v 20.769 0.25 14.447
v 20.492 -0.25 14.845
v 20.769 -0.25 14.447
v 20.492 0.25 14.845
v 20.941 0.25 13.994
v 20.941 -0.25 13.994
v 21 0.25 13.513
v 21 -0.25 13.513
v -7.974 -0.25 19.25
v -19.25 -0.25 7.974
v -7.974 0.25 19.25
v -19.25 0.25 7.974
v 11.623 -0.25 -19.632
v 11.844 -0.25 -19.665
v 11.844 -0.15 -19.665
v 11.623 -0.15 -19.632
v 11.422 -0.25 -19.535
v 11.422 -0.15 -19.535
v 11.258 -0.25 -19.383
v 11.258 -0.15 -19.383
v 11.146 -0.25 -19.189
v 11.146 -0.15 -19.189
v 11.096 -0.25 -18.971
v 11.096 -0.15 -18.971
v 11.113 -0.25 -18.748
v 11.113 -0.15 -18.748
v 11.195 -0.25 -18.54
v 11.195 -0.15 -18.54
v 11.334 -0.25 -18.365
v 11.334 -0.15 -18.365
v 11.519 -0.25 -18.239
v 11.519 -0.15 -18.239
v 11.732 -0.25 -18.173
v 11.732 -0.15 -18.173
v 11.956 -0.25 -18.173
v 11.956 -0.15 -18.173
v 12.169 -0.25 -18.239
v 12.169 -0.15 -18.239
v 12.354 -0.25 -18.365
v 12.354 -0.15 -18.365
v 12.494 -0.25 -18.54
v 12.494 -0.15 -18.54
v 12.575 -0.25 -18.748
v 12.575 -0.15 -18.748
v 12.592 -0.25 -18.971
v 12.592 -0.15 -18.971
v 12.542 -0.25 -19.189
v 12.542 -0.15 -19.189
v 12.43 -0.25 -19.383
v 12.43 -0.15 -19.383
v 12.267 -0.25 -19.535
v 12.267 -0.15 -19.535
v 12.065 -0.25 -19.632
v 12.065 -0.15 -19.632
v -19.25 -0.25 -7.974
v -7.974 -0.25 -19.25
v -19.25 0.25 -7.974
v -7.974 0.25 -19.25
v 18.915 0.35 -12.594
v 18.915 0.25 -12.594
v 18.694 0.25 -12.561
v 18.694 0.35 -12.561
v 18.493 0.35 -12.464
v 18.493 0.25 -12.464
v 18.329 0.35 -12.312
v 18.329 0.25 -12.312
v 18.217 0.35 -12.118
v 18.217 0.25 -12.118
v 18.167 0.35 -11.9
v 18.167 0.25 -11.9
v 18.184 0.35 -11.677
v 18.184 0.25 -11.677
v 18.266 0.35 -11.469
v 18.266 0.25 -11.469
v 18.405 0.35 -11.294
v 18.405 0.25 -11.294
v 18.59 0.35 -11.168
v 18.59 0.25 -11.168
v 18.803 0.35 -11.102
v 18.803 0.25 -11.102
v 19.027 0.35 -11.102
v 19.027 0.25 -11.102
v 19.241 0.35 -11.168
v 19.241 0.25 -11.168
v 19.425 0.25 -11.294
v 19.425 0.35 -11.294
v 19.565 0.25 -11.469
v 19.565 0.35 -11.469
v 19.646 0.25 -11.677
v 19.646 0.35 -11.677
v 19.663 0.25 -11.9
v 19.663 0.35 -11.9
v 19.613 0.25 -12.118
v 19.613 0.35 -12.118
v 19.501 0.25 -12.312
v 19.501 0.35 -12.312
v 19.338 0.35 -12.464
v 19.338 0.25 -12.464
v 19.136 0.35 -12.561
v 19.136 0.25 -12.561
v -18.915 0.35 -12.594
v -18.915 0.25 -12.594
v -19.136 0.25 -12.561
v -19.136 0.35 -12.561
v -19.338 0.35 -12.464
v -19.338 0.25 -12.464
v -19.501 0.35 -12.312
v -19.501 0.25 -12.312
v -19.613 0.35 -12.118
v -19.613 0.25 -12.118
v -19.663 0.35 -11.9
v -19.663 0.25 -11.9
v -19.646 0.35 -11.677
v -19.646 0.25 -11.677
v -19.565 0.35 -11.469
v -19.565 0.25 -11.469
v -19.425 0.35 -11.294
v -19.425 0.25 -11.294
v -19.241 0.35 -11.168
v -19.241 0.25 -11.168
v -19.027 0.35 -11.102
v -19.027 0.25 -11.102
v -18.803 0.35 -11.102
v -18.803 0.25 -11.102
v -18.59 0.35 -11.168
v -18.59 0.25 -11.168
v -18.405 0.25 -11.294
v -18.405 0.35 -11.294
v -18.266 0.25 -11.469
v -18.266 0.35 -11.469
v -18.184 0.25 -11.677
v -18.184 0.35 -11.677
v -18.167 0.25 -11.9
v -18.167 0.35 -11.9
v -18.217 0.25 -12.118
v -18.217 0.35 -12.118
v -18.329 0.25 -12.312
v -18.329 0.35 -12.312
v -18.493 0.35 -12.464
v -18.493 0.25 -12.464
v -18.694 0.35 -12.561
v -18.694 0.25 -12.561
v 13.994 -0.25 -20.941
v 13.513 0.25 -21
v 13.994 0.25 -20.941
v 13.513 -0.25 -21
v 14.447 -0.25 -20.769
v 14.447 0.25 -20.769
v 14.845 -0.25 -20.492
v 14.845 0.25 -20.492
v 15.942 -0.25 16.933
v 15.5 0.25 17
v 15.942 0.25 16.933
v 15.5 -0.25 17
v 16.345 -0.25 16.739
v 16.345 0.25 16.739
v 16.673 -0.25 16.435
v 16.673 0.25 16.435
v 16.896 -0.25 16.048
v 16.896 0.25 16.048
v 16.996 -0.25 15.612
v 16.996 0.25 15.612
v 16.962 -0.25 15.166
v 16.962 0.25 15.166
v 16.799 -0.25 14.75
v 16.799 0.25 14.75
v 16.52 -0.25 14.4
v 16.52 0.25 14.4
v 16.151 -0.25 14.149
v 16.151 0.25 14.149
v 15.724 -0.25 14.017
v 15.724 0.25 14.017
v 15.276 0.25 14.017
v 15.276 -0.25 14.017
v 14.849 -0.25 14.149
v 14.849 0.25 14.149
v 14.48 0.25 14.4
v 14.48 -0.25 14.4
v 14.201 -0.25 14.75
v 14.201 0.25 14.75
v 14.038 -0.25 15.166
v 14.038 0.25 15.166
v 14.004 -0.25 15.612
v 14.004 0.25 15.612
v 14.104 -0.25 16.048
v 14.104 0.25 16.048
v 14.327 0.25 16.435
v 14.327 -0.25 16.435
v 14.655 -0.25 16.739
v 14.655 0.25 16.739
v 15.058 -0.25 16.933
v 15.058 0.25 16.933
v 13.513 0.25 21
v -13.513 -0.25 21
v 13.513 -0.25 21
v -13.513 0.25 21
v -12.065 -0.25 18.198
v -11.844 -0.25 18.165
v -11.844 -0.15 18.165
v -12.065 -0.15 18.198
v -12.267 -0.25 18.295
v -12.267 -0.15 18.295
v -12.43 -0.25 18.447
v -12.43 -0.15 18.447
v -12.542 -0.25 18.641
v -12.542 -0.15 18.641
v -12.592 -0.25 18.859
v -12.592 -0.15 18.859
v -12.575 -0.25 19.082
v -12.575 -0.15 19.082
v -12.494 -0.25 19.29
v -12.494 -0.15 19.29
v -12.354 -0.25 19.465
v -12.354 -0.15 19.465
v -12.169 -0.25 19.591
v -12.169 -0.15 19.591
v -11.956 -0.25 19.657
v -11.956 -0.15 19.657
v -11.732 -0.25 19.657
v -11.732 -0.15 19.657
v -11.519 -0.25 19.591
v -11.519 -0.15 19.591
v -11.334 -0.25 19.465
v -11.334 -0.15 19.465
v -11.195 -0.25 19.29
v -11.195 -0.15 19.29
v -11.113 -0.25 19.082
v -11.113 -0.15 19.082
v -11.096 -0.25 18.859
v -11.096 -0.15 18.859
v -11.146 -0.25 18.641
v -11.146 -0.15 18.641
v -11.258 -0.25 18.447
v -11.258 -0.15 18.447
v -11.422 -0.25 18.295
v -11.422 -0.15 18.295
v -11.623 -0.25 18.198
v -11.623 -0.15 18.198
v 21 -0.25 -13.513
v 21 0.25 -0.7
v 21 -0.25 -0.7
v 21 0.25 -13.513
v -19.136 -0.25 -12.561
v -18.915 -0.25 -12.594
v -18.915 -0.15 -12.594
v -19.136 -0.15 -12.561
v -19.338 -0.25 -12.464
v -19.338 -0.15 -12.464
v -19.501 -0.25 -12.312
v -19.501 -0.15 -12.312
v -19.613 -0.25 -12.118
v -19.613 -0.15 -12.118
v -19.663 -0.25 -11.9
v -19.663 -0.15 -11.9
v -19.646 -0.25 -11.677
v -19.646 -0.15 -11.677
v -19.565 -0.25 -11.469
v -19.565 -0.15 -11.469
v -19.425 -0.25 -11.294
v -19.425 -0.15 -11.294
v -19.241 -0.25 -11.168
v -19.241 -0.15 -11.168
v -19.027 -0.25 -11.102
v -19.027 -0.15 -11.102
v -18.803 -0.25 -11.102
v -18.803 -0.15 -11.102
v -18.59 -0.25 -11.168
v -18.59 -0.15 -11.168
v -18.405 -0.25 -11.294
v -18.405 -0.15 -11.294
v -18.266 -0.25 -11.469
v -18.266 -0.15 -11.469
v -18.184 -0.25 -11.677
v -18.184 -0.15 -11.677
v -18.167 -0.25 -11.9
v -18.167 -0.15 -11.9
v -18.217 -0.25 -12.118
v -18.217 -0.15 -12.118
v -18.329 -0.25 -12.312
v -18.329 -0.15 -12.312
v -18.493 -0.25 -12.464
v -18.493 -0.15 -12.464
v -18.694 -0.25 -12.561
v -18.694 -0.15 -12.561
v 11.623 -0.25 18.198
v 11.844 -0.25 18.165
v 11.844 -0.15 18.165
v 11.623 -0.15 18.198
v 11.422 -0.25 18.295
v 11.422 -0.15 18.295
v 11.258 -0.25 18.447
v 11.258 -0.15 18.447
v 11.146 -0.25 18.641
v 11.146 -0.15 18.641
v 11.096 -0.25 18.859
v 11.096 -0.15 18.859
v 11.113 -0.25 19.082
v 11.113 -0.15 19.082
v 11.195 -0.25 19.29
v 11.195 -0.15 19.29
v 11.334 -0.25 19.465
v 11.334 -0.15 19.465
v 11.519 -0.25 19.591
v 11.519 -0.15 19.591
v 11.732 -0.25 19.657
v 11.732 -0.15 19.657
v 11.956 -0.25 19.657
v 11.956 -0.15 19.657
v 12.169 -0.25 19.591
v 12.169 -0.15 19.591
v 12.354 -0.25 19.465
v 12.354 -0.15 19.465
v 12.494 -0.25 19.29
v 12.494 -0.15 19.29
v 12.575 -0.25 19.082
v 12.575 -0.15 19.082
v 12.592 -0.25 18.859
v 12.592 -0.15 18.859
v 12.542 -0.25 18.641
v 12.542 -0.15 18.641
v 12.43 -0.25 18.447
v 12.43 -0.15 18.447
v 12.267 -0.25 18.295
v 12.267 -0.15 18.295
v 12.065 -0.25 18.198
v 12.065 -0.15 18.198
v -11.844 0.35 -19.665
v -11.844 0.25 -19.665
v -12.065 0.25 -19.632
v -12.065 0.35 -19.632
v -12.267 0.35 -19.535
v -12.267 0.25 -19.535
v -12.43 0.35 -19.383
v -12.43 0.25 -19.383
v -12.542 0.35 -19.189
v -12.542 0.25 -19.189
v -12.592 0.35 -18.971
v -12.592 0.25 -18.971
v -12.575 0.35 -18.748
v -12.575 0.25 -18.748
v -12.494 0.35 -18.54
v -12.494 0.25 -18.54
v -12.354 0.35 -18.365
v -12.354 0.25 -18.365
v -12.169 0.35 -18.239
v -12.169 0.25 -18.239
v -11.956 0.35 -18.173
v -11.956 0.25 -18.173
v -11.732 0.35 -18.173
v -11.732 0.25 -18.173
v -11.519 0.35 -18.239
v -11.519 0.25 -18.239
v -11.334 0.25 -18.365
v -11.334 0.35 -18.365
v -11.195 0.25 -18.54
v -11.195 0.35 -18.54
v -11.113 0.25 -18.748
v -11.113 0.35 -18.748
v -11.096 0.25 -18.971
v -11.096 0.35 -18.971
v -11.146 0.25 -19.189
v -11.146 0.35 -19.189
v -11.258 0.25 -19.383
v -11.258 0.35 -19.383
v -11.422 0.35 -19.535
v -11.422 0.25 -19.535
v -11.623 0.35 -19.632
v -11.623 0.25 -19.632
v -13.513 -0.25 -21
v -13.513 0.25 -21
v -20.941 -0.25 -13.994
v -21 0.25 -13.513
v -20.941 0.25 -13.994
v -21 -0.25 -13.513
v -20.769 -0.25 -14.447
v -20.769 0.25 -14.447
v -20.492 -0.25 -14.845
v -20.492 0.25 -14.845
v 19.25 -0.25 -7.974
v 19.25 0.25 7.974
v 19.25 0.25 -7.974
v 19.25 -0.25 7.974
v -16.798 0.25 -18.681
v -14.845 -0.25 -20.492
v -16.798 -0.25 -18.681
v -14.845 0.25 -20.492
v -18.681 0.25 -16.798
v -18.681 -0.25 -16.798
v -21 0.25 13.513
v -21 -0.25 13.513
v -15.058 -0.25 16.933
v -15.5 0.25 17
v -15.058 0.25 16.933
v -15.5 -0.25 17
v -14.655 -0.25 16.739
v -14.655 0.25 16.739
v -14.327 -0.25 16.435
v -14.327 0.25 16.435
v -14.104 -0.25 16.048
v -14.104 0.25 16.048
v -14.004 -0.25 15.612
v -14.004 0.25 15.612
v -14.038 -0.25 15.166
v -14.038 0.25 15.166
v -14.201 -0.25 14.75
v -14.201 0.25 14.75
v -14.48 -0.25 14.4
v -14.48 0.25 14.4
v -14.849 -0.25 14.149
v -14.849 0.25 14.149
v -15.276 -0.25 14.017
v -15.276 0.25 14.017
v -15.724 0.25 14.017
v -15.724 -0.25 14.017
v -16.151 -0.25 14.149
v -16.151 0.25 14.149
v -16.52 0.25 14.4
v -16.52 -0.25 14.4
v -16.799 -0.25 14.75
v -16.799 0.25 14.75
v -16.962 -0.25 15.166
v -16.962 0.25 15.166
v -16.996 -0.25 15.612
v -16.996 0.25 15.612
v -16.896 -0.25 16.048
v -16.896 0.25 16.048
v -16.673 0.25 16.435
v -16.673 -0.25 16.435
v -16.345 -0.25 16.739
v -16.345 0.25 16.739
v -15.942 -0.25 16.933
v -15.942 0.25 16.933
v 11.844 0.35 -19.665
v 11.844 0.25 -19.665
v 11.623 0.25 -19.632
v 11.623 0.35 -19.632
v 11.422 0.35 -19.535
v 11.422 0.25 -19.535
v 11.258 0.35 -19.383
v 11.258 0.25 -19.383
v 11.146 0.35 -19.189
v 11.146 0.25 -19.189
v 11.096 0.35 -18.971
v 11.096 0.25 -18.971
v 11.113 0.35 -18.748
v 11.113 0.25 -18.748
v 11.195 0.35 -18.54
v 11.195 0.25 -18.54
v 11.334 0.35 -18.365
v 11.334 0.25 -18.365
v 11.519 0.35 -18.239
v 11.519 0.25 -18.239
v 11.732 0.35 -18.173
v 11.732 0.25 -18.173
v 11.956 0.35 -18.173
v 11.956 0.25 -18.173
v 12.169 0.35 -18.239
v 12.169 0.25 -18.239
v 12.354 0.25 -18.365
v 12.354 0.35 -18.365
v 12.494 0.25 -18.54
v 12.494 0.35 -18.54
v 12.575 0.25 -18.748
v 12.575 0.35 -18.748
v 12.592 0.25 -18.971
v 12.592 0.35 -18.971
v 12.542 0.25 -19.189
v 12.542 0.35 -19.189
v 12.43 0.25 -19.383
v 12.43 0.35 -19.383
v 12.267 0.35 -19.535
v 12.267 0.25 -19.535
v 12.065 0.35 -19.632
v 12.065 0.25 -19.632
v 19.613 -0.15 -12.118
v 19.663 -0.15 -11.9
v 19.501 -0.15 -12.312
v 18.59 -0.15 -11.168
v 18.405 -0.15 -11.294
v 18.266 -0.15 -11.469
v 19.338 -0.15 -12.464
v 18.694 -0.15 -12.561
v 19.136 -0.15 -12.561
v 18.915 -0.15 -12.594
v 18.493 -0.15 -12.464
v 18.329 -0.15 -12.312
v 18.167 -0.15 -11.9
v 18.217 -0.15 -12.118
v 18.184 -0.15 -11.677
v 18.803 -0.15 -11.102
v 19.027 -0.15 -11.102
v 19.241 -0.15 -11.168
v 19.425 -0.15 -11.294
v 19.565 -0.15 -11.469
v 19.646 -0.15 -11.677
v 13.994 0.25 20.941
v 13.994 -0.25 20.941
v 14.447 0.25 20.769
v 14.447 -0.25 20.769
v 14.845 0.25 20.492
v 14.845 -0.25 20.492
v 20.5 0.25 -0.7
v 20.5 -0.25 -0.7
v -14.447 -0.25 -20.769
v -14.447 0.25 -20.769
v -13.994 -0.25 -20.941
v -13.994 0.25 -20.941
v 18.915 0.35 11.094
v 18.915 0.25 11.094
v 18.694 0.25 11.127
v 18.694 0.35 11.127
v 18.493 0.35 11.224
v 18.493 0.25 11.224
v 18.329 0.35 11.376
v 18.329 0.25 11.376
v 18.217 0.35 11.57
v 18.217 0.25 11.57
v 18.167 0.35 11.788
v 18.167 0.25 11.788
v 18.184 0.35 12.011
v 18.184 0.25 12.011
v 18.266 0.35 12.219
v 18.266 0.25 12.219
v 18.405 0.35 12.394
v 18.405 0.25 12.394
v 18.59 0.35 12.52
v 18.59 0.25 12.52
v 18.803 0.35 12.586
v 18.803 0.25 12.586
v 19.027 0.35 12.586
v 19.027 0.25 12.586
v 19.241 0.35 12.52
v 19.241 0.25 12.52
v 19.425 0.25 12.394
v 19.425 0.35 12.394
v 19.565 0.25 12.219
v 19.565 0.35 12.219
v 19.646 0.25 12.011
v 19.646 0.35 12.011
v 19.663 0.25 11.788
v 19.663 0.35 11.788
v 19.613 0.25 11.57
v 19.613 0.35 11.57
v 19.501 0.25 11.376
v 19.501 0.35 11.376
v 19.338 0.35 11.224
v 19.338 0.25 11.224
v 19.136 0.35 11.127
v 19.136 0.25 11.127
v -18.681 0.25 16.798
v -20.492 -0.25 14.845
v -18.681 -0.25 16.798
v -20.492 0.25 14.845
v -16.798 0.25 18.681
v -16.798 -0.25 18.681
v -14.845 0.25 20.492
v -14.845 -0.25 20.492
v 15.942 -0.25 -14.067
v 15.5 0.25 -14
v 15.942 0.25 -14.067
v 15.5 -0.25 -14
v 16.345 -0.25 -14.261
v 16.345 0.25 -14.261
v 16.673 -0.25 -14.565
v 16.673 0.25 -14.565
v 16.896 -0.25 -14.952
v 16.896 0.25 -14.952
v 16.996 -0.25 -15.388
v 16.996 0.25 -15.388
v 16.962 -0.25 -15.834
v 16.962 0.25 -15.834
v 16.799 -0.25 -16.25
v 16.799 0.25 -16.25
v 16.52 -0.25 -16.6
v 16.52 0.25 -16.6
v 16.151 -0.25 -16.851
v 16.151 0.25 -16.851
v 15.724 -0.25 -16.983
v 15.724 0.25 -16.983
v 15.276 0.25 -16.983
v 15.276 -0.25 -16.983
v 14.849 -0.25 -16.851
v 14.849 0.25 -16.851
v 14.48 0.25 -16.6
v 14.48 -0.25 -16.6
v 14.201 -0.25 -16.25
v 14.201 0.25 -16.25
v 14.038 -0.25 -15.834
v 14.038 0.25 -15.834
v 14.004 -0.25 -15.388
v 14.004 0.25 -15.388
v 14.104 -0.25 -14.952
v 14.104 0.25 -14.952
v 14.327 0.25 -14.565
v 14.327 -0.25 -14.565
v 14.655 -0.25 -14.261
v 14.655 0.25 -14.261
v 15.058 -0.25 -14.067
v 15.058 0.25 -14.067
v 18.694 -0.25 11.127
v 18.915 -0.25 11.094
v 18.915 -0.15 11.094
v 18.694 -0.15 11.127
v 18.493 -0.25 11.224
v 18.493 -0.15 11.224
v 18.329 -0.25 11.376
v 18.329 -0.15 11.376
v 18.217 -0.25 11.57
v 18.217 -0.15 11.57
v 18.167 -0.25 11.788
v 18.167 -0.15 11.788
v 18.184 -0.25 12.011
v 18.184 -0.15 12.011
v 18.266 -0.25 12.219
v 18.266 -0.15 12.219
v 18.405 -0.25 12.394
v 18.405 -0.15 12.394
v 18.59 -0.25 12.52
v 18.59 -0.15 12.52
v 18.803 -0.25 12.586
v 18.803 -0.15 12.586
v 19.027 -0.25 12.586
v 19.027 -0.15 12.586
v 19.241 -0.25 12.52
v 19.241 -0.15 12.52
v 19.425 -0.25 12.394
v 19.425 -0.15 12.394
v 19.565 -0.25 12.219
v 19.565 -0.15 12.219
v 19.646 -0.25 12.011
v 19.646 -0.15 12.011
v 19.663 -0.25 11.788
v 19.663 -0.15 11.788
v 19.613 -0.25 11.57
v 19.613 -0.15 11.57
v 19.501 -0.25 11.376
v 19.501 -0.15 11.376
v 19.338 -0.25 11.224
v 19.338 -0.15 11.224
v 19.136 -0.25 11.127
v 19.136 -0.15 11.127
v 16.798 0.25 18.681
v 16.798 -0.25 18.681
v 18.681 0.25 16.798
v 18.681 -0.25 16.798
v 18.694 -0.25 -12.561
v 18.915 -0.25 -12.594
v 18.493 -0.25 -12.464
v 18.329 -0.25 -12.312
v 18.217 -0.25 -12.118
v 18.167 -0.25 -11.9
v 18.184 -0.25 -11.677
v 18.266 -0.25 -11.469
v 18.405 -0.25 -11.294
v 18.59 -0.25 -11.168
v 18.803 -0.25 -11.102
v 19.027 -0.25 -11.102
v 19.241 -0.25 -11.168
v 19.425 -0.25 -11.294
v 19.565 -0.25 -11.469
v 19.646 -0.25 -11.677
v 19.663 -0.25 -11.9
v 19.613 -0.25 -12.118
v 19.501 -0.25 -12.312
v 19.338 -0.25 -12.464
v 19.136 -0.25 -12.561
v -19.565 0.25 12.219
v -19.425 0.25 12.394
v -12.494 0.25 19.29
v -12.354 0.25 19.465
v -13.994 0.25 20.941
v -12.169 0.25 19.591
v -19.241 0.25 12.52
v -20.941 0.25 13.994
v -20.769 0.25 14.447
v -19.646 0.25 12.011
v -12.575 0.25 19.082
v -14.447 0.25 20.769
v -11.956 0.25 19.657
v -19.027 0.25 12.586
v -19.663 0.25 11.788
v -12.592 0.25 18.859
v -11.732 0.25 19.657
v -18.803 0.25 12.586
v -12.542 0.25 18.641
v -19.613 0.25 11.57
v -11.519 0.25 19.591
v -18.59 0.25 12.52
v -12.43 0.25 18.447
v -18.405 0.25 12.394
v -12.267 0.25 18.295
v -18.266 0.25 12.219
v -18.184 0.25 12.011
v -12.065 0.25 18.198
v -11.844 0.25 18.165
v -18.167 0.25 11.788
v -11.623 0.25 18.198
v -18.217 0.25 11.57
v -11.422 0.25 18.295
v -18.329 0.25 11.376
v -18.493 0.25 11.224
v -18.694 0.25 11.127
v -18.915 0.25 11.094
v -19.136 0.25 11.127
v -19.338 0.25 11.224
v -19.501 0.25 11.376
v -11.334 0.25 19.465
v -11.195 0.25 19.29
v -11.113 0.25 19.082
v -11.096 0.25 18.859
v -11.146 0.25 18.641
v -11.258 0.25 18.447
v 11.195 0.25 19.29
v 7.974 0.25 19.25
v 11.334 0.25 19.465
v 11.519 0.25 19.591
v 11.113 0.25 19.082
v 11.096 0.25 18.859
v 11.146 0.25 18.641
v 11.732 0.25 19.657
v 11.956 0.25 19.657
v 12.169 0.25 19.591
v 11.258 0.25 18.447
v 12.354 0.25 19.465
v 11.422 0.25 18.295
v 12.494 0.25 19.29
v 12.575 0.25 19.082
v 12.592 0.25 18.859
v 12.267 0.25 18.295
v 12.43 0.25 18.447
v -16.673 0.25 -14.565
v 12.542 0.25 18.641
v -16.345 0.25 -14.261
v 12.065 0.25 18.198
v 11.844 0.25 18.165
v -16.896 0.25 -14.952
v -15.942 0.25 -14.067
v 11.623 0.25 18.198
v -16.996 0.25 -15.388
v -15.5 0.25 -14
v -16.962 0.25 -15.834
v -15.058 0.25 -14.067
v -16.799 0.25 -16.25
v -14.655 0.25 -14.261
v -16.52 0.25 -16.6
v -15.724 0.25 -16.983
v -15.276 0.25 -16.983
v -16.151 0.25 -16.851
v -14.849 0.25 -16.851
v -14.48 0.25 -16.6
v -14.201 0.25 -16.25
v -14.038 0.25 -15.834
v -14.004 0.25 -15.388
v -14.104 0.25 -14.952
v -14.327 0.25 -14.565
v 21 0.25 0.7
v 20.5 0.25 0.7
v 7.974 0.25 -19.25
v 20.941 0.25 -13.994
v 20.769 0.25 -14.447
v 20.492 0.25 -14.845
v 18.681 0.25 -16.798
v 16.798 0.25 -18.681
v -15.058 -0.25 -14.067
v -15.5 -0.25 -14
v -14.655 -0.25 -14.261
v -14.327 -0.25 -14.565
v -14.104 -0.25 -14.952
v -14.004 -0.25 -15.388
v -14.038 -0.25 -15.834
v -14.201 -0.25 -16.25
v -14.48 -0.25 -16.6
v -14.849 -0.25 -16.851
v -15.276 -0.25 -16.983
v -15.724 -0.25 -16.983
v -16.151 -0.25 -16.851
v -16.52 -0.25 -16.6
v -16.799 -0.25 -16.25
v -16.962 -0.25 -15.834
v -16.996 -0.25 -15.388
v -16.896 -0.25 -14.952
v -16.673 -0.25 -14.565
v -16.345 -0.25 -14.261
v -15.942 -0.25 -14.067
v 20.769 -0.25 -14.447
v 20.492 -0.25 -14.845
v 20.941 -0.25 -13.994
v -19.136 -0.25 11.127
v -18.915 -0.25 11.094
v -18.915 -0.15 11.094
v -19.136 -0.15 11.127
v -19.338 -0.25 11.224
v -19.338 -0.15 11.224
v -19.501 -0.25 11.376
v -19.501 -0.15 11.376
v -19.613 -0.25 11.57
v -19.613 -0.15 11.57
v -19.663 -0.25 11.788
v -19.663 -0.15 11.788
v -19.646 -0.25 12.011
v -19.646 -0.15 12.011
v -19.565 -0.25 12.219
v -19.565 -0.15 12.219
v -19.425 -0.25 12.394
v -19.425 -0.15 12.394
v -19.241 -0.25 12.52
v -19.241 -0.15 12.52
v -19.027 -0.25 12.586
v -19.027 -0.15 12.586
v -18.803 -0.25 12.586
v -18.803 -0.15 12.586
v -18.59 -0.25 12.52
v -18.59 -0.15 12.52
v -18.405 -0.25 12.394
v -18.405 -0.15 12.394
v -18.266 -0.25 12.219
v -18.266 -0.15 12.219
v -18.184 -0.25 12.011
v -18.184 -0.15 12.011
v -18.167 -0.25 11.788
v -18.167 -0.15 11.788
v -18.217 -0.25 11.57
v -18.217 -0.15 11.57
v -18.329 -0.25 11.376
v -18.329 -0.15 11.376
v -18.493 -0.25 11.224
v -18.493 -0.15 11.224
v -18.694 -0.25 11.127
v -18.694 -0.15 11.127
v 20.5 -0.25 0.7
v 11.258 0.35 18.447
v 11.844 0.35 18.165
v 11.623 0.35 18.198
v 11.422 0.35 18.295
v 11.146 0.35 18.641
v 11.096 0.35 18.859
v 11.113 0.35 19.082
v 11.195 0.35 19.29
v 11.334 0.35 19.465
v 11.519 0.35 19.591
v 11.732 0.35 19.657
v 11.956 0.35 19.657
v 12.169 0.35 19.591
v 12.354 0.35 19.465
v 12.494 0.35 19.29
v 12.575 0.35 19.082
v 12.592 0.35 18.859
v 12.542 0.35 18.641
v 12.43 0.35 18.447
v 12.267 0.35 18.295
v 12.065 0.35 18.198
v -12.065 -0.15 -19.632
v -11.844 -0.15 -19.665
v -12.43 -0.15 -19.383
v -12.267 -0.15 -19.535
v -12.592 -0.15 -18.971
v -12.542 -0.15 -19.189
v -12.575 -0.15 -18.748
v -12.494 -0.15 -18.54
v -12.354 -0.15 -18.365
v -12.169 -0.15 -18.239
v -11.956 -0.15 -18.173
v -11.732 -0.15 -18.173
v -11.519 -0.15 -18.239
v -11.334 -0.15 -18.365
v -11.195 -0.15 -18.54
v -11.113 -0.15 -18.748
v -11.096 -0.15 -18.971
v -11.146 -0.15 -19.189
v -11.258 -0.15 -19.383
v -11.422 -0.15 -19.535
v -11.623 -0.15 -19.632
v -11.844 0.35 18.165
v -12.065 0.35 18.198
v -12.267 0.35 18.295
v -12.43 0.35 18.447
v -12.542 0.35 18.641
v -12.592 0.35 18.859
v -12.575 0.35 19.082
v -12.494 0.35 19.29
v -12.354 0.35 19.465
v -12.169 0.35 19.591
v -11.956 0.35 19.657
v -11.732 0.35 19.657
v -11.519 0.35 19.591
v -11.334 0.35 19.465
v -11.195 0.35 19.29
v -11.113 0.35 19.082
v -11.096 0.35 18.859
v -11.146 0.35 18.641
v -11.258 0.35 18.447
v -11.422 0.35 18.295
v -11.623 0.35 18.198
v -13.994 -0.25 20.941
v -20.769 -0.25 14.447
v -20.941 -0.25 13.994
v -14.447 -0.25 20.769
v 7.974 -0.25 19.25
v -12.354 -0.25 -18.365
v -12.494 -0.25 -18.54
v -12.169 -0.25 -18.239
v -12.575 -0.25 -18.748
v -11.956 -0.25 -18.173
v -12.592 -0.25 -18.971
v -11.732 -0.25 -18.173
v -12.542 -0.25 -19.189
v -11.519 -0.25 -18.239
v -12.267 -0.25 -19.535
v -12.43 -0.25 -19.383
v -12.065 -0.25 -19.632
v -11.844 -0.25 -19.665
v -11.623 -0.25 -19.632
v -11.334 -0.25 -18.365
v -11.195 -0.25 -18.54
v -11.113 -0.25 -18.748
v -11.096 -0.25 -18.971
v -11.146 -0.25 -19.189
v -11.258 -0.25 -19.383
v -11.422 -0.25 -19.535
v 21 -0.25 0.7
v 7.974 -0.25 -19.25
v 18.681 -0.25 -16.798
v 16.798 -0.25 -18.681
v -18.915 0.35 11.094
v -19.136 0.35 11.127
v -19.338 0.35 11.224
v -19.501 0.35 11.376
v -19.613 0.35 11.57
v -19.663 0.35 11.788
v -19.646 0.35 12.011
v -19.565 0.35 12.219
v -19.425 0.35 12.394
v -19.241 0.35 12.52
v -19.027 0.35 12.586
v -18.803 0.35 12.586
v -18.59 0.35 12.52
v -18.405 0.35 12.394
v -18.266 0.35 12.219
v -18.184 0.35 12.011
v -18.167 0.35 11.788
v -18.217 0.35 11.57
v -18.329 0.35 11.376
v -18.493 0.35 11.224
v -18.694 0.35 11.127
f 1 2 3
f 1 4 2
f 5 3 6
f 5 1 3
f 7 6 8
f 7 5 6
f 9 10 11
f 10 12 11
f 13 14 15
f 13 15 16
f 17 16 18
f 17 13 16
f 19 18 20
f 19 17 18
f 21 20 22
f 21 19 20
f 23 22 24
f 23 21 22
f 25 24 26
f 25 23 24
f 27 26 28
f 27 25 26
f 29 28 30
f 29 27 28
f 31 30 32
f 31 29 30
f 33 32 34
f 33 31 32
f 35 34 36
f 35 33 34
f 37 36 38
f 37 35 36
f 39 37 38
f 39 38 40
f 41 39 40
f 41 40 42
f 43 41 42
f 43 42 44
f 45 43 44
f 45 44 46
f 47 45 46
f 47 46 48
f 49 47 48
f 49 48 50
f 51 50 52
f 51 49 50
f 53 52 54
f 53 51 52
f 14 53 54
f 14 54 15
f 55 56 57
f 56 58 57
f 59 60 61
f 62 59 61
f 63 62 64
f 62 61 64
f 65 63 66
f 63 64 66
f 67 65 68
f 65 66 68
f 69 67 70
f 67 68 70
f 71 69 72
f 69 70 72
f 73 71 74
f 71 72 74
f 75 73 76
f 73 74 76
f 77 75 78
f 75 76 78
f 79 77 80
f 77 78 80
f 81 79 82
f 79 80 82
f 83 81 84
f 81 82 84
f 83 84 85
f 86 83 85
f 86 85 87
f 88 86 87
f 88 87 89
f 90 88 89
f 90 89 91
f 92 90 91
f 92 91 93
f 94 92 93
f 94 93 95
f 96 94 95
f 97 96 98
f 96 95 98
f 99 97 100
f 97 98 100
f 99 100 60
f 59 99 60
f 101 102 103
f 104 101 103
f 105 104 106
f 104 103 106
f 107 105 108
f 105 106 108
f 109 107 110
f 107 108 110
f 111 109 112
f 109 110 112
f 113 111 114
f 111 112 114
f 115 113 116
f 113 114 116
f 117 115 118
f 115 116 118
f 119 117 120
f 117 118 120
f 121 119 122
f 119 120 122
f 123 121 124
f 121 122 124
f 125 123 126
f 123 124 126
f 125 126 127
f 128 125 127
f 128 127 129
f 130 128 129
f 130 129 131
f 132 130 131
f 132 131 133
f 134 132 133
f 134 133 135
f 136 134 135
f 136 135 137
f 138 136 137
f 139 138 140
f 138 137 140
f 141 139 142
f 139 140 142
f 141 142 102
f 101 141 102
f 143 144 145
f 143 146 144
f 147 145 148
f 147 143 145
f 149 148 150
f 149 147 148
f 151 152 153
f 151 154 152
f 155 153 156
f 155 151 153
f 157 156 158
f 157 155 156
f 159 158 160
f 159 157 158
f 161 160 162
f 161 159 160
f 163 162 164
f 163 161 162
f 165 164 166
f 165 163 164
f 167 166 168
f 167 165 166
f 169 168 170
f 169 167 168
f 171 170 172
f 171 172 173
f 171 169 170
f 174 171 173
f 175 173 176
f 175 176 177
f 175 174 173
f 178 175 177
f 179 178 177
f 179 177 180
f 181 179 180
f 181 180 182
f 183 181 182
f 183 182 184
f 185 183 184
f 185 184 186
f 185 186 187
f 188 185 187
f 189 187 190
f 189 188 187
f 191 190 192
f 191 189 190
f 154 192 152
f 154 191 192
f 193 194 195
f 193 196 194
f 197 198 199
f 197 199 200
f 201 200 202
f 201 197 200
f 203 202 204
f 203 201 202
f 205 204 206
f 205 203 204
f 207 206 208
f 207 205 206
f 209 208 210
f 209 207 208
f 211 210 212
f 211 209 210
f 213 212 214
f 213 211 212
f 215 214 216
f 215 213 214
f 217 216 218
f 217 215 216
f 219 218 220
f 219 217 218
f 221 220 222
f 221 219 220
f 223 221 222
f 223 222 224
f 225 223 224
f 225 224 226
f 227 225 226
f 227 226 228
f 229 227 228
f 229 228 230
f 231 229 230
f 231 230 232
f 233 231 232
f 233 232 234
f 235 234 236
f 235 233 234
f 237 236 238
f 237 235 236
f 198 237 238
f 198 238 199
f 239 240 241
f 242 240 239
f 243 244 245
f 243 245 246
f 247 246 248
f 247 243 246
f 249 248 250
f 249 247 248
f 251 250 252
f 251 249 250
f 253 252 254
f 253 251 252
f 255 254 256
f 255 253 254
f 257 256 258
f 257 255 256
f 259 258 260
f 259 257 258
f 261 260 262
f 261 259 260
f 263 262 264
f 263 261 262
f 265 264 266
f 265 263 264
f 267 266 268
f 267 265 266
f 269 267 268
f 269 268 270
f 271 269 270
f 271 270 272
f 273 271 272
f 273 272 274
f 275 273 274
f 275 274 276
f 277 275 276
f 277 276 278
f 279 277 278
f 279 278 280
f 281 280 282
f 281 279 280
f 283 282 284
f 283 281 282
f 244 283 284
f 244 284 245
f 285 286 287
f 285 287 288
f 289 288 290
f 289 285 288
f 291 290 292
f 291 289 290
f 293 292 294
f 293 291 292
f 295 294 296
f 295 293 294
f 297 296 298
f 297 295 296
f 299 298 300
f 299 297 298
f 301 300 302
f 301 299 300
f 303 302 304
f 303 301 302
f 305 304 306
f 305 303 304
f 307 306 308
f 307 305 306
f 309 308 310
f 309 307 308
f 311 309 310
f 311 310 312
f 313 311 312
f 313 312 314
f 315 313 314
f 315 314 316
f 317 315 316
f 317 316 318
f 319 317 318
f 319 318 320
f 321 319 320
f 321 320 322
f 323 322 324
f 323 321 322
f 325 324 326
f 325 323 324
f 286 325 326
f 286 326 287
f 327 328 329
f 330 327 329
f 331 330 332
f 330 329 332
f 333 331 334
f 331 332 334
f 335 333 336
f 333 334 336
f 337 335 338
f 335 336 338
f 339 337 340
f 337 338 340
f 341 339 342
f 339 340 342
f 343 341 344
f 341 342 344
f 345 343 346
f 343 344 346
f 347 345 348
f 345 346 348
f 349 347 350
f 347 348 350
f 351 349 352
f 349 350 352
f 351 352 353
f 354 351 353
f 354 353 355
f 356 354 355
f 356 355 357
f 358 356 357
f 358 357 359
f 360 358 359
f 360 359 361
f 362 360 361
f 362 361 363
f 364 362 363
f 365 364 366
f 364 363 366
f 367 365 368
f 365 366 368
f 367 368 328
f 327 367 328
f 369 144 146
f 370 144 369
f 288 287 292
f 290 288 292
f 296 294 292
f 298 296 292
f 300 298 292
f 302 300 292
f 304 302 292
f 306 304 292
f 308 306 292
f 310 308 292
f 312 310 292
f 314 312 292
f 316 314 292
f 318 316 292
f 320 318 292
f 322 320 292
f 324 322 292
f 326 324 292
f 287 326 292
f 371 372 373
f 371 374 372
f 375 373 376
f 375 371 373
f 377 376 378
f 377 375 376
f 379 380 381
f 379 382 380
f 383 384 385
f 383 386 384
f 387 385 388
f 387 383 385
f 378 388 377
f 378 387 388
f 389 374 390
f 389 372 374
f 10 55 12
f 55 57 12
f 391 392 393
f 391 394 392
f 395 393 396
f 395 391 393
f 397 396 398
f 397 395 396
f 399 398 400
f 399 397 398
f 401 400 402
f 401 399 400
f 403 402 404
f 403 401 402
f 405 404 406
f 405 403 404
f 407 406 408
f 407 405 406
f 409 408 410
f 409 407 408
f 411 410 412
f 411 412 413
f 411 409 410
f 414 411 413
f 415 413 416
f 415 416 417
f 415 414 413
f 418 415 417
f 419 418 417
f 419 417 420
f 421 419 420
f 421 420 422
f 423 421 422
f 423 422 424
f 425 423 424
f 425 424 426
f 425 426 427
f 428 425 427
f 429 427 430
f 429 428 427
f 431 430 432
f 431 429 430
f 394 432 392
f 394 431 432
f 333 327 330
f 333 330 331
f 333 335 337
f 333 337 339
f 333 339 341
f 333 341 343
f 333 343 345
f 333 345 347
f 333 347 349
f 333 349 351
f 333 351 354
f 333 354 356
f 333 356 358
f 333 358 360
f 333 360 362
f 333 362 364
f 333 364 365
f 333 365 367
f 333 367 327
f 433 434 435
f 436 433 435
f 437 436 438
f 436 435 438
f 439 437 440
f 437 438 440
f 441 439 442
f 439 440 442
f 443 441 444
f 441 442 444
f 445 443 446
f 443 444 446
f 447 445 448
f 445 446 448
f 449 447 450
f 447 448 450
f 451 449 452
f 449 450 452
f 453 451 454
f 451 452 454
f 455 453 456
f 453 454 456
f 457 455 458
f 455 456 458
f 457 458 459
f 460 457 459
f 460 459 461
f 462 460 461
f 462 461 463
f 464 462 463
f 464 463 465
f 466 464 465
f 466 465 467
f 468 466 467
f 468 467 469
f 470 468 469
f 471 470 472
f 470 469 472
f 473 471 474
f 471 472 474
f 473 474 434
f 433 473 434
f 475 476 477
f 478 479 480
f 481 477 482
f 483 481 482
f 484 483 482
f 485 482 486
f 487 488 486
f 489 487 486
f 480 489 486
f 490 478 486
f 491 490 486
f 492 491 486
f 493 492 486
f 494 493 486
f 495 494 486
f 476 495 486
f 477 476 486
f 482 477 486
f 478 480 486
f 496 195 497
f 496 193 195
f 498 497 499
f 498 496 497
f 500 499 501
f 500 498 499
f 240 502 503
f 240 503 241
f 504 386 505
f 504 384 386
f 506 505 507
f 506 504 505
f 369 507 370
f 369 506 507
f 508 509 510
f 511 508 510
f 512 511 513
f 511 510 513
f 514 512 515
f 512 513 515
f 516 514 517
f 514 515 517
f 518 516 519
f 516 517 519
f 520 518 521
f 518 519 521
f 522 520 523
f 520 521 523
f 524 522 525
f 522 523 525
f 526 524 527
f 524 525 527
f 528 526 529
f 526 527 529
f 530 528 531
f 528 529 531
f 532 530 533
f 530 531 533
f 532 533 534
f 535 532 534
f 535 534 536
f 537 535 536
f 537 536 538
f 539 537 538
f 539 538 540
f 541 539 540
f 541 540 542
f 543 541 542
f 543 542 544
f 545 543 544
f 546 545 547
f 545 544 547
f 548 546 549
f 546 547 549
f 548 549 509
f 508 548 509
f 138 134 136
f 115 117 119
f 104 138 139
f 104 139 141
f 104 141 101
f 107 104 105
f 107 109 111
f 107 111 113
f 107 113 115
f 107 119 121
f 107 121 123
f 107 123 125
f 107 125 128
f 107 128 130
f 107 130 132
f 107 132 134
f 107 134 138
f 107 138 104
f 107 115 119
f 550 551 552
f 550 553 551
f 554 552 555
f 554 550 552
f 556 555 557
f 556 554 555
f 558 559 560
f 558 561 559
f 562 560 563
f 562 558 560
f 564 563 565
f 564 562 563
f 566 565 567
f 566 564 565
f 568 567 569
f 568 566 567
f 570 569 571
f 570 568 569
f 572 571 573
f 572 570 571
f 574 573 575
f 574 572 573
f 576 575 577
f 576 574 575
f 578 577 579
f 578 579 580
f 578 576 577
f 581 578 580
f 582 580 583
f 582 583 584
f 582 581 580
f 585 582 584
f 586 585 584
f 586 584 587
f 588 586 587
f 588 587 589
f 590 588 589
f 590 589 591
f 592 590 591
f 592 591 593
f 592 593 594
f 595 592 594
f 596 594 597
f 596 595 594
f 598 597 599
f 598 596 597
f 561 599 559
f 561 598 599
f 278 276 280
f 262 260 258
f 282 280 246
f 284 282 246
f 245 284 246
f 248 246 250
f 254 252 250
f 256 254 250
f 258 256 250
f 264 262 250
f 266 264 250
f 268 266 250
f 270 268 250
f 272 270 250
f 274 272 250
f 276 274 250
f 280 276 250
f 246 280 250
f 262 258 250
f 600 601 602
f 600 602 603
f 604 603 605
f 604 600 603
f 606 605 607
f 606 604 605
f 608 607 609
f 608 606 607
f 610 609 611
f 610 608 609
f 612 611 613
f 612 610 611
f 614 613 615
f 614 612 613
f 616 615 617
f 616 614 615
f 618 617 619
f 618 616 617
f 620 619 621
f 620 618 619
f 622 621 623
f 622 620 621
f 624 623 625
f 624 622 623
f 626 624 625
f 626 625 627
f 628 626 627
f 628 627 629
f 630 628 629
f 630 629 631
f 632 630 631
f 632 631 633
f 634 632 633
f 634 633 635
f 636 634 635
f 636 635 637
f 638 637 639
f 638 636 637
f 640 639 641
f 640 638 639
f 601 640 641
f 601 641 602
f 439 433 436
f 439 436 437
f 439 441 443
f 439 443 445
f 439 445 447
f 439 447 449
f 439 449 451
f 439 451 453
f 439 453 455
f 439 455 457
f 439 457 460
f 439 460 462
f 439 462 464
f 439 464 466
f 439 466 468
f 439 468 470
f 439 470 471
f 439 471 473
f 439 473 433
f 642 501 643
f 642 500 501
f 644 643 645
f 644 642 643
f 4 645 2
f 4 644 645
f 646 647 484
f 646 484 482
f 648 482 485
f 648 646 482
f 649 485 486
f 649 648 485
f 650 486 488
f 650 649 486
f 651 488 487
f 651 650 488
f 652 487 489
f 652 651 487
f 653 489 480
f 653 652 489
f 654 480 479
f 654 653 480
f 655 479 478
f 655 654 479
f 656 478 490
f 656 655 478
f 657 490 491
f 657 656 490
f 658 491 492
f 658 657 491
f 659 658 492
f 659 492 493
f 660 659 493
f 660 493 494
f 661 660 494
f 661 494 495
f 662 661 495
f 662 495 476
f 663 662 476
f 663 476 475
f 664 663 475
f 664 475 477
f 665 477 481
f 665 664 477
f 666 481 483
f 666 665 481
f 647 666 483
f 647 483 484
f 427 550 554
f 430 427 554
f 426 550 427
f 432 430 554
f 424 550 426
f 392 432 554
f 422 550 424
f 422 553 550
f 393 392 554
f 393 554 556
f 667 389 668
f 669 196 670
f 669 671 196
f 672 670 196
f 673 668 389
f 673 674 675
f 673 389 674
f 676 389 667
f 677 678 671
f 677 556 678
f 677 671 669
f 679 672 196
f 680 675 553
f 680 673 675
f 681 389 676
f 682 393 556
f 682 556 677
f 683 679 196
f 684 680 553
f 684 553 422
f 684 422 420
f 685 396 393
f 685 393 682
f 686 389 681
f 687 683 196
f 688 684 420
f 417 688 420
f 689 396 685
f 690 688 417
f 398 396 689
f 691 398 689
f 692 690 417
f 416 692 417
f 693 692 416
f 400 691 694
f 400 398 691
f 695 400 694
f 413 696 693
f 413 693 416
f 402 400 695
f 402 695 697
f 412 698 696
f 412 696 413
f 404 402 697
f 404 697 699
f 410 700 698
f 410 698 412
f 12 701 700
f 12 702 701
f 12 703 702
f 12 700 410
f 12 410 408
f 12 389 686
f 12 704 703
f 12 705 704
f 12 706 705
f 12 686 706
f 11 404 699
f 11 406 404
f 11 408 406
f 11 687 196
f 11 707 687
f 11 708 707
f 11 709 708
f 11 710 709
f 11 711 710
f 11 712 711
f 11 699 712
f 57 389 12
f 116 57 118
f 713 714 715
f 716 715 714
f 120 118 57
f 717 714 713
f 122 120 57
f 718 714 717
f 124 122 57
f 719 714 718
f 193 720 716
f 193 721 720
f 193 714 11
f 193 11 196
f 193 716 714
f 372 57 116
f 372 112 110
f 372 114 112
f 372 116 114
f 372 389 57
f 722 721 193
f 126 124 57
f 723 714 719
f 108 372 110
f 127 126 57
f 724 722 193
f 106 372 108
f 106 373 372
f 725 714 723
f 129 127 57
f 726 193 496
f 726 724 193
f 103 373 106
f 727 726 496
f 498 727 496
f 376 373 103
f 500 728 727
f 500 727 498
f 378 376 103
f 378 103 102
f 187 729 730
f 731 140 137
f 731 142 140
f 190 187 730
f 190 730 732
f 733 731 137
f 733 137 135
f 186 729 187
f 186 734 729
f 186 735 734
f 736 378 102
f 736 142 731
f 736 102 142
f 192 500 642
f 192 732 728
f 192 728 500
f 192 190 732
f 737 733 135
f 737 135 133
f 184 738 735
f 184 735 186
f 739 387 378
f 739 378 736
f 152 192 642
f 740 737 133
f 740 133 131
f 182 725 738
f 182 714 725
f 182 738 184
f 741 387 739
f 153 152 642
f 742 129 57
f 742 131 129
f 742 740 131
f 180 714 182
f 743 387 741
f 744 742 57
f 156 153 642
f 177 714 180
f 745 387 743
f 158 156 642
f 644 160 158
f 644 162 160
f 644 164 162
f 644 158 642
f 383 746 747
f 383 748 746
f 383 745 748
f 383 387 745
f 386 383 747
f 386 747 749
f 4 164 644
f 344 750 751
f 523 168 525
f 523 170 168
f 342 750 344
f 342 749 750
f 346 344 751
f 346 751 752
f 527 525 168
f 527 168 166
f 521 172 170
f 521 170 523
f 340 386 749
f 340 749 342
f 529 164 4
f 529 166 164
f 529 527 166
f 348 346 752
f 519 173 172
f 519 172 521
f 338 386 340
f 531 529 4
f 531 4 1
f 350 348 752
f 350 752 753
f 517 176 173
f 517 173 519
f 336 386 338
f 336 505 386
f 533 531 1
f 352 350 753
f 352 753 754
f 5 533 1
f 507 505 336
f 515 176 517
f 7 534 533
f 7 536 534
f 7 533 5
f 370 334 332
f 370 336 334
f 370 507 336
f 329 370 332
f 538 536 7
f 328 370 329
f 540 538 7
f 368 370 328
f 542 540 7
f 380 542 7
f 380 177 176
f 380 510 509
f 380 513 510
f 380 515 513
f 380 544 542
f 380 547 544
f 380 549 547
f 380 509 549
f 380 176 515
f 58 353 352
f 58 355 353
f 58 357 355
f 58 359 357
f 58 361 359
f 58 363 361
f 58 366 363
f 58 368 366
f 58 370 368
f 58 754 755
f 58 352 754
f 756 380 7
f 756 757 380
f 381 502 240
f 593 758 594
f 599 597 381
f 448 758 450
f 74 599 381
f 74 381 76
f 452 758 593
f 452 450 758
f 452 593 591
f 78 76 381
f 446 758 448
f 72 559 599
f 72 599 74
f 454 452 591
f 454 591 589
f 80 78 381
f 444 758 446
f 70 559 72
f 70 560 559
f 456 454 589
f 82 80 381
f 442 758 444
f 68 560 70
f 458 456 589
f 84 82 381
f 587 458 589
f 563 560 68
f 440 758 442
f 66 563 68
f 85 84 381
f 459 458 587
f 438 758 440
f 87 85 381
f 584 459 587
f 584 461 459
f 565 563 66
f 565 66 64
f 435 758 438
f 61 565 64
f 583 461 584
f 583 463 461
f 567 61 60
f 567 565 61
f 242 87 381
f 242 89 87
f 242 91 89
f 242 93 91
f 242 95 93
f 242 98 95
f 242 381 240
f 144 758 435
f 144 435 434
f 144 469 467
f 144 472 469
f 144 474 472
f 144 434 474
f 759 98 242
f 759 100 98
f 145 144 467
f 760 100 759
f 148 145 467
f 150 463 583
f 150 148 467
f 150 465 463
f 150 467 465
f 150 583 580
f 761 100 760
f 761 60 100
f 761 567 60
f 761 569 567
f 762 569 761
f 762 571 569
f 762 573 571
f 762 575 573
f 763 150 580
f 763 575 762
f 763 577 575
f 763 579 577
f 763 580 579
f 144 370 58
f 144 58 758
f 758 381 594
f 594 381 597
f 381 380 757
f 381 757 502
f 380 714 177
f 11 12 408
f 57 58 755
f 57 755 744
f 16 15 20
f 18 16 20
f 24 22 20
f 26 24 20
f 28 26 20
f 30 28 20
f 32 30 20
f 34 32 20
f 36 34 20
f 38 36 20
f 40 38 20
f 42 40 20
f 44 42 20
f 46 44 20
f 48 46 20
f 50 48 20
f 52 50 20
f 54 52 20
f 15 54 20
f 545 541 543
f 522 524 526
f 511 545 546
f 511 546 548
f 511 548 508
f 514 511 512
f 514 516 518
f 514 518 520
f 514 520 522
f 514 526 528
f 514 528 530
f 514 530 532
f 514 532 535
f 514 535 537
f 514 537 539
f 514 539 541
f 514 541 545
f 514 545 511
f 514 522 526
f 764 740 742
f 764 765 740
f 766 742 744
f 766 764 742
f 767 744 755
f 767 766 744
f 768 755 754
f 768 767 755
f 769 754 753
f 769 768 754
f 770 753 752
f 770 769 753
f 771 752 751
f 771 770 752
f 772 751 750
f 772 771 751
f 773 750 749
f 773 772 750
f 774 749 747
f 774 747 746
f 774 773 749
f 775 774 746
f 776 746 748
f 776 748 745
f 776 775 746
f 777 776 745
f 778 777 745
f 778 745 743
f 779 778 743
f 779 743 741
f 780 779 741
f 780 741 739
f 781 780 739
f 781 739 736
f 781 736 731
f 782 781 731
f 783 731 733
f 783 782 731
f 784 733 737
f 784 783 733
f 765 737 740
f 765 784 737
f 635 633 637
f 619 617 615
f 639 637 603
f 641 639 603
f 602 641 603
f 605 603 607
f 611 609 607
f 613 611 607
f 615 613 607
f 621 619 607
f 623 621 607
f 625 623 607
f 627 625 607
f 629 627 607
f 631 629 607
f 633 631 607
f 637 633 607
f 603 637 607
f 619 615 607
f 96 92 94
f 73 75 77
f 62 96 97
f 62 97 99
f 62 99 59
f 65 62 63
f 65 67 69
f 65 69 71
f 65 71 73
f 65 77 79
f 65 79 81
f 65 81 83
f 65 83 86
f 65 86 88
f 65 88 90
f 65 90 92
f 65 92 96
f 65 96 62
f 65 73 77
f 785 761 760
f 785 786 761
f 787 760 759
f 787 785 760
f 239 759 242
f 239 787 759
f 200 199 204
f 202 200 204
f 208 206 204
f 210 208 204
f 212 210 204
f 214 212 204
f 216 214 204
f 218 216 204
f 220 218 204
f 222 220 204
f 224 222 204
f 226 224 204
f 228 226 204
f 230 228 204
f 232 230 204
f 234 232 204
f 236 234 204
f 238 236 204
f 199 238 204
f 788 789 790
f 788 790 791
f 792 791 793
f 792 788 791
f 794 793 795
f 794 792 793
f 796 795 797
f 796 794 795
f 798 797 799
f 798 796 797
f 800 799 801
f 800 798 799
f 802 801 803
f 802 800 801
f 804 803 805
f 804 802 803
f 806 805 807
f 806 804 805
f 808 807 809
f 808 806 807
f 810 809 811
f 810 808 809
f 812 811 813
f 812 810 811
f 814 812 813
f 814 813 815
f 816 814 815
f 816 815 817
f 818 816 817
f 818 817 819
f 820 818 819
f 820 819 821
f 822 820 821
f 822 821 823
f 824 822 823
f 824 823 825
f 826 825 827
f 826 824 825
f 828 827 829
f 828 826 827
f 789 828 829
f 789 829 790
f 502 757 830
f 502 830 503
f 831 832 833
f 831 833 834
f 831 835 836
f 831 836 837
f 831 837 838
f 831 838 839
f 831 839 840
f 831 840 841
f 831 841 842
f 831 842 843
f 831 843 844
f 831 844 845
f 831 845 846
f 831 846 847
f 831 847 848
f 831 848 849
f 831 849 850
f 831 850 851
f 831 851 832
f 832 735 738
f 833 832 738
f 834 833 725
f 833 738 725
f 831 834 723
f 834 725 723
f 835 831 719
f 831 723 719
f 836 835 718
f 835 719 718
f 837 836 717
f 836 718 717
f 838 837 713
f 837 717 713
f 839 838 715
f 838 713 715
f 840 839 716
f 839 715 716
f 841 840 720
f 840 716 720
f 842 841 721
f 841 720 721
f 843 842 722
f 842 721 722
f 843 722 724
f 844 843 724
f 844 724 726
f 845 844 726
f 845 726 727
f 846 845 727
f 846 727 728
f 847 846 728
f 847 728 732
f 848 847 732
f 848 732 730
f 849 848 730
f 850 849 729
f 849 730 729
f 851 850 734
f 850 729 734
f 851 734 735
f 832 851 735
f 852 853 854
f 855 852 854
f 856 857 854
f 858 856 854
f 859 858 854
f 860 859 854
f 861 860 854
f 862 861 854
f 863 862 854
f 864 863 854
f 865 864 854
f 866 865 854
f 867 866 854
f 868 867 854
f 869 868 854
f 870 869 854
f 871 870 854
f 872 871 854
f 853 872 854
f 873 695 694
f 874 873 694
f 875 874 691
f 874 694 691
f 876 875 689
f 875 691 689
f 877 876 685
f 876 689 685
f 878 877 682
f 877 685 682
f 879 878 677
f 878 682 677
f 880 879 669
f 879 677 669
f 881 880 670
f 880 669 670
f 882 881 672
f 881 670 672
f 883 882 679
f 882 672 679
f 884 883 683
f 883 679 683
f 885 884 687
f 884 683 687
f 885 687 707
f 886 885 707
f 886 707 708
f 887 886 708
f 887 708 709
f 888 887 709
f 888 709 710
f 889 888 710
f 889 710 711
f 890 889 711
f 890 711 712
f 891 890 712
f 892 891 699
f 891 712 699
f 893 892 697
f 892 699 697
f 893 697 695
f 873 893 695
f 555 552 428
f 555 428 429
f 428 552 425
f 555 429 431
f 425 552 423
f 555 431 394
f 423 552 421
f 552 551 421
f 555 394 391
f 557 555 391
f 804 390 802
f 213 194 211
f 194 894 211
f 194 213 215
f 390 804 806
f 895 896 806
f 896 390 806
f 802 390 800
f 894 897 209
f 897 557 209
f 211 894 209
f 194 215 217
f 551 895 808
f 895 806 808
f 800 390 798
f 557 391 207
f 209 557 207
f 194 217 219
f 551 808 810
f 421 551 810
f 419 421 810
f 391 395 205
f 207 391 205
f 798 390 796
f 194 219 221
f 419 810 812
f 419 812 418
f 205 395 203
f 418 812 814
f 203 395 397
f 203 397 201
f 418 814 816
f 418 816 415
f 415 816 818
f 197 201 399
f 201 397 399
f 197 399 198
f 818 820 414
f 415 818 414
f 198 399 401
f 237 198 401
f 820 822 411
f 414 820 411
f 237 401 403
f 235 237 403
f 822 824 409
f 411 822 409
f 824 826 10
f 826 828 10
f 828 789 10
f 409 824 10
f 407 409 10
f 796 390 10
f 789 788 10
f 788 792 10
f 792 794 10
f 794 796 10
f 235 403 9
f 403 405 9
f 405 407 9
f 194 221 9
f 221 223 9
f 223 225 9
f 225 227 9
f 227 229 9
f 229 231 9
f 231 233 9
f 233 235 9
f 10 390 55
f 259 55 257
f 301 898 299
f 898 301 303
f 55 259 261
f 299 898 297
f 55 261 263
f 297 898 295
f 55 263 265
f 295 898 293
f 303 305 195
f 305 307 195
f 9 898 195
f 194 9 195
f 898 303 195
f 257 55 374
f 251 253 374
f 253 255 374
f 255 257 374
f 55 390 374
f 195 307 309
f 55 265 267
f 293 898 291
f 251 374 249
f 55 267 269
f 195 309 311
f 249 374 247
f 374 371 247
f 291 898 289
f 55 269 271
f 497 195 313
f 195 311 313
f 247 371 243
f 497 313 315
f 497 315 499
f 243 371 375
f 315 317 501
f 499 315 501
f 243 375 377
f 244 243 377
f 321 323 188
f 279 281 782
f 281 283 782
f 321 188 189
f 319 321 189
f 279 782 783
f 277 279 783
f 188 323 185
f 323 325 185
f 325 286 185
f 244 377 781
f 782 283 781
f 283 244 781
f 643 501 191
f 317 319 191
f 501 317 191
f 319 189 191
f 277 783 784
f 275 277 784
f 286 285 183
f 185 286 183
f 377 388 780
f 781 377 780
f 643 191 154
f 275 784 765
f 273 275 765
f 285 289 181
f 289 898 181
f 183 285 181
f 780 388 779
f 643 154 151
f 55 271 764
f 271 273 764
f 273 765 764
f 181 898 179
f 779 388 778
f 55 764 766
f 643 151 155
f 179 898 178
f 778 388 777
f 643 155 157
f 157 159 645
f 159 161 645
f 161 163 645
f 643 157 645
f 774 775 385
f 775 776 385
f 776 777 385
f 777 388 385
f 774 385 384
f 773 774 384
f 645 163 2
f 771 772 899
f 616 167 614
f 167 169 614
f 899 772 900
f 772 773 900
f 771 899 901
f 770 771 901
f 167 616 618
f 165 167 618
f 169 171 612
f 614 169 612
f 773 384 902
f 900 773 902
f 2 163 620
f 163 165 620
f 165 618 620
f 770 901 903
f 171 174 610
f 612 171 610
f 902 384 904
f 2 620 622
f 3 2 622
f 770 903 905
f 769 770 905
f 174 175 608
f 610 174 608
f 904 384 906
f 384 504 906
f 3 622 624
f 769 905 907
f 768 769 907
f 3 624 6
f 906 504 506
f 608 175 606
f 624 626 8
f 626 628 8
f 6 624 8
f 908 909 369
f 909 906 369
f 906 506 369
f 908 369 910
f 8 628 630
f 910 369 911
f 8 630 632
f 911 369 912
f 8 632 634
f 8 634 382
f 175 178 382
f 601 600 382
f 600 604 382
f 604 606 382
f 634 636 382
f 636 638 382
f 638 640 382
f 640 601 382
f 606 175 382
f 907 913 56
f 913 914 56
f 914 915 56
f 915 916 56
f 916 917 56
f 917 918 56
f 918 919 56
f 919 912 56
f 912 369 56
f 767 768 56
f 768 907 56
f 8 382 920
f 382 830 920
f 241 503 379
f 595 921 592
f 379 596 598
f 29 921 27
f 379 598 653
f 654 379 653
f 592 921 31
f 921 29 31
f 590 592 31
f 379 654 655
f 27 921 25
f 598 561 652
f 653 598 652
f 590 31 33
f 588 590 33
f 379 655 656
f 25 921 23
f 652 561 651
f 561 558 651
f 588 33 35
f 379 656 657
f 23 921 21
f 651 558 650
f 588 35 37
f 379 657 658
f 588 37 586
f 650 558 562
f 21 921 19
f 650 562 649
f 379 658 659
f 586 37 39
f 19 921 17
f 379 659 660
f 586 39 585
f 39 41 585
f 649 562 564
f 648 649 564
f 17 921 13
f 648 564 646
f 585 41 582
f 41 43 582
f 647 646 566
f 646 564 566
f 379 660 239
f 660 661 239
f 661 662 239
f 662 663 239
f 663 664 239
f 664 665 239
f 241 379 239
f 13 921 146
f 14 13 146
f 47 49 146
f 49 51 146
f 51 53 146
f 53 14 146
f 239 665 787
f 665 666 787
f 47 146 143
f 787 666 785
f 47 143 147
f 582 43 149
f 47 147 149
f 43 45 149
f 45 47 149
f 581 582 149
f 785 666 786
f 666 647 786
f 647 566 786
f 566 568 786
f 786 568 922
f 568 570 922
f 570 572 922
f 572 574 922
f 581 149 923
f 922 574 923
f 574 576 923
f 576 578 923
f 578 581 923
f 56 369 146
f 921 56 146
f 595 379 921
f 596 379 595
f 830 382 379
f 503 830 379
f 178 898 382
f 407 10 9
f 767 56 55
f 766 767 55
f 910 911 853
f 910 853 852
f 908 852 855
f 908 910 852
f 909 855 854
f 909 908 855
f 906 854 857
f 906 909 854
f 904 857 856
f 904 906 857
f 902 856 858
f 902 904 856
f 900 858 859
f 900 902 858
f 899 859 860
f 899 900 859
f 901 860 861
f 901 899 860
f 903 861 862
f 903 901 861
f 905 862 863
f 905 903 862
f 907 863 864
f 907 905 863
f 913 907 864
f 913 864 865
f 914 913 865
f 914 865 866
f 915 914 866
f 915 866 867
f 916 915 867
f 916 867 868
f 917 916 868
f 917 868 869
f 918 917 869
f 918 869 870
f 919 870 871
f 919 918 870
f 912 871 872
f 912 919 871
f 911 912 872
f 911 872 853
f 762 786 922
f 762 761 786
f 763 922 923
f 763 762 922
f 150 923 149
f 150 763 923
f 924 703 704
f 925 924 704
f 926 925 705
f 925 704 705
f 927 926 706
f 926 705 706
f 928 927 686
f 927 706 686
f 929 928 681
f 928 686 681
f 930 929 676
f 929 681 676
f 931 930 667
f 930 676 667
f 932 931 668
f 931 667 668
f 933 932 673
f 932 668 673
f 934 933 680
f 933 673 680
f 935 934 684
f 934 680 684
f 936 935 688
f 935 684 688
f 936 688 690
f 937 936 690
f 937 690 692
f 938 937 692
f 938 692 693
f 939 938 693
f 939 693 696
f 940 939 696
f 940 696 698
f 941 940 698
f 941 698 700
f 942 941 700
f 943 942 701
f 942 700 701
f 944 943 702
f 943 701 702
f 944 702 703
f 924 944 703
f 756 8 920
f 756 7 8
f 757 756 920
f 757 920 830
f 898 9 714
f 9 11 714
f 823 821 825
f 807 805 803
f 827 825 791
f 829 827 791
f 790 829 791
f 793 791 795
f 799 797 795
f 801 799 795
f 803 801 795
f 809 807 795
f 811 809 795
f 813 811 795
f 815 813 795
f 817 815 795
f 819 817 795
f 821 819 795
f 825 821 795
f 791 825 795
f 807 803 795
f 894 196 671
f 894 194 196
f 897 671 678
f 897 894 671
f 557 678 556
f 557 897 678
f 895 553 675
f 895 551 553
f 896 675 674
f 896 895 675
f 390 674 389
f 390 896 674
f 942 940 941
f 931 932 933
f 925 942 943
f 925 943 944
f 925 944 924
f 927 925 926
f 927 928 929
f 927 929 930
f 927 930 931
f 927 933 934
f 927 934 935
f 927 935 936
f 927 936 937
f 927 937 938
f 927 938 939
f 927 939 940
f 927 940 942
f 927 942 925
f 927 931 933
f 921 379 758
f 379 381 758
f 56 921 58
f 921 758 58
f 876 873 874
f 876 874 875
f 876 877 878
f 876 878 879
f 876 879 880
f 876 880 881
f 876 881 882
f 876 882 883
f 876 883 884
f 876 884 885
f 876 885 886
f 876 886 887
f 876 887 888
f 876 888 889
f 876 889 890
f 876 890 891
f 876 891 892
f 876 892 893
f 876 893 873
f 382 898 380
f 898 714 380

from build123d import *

# Parameters (mm, degrees)
ESBO_O1_R                = 1.5
RESSALTO_EXTRUS_O1_DEPTH = 0.25
RESSALTO_EXTRUS_O2_START = 0.25
ESBO_O1_3_R              = 0.75
RESSALTO_EXTRUS_O2_DEPTH = 0.1
CORTE_EXTRUS_O1_START    = -0.25
ESBO_O1_4_R              = 0.75
CORTE_EXTRUS_O1_DEPTH    = 0.1
FILETE1_R                = 2


with BuildPart() as part:
    # Esboço1 → Ressalto-extrusão1 (new, symmetric)
    with BuildSketch(Plane(origin=(0, 0, 0), x_dir=(1, 0, 0), z_dir=(0, 1, 0))):
        with BuildLine():
            Line((-14.269532703, -20.99999997), (14.269532672, -20.99999997))
            ThreePointArc((14.269532672, -20.99999997), (17.748380193, -17.748380193), (20.99999997, -14.269532672))
            Line((20.99999997, -14.269532672), (20.99999997, -0.699999985))
            Line((20.99999997, -0.699999985), (20.49999997, -0.699999985))
            Line((20.49999997, -0.699999985), (20.49999997, 0.700000015))
            Line((20.49999997, 0.700000015), (20.99999997, 0.700000015))
            Line((20.99999997, 0.700000015), (20.99999997, 14.269532702))
            ThreePointArc((20.99999997, 14.269532702), (17.748380193, 17.748380223), (14.269532672, 21))
            Line((14.269532672, 21), (-14.269532702, 21))
            ThreePointArc((-14.269532702, 21), (-17.748380223, 17.748380223), (-21, 14.269532703))
            Line((-21, 14.269532703), (-21, -14.269532672))
            ThreePointArc((-21, -14.269532672), (-17.748380223, -17.748380193), (-14.269532703, -20.99999997))
        make_face()
        with Locations(Location((15.5, 15.5, 0), (0, 0, 270))):
            Circle(ESBO_O1_R, mode=Mode.SUBTRACT)
        with Locations(Location((-15.5, 15.5, 0), (0, 0, 270))):
            Circle(ESBO_O1_R, mode=Mode.SUBTRACT)
        with Locations(Location((-15.5, -15.5, 0), (0, 0, 270))):
            Circle(ESBO_O1_R, mode=Mode.SUBTRACT)
        with Locations(Location((15.5, -15.5, 0), (0, 0, 270))):
            Circle(ESBO_O1_R, mode=Mode.SUBTRACT)
        Polygon((19.25, 7.973611076), (7.973611076, 19.25), (-7.973611076, 19.25), (-19.25, 7.973611076), (-19.25, -7.973611076), (-7.973611076, -19.25), (7.973611076, -19.25), (19.25, -7.973611076), align=None, mode=Mode.SUBTRACT)
    extrude(amount=RESSALTO_EXTRUS_O1_DEPTH, both=True)

    # Esboço1<3> → Ressalto-extrusão2 (add)
    with BuildSketch(Plane(origin=(0, 0, 0), x_dir=(1, 0, 0), z_dir=(0, 1, 0)).offset(RESSALTO_EXTRUS_O2_START)):
        with Locations(Location((-18.915106397, 11.844038585, 0), (0, 0, 90))):
            Circle(ESBO_O1_3_R)
        with Locations(Location((-11.844038585, 18.915106397, 0), (0, 0, 90))):
            Circle(ESBO_O1_3_R)
        with Locations(Location((11.844038585, 18.915106397, 0), (0, 0, 90))):
            Circle(ESBO_O1_3_R)
        with Locations(Location((18.915106397, 11.844038585, 0), (0, 0, 90))):
            Circle(ESBO_O1_3_R)
        with Locations(Location((18.915106397, -11.844038585, 0), (0, 0, 90))):
            Circle(ESBO_O1_3_R)
        with Locations(Location((11.844038585, -18.915106397, 0), (0, 0, 90))):
            Circle(ESBO_O1_3_R)
        with Locations(Location((-11.844038585, -18.915106397, 0), (0, 0, 90))):
            Circle(ESBO_O1_3_R)
        with Locations(Location((-18.915106397, -11.844038585, 0), (0, 0, 90))):
            Circle(ESBO_O1_3_R)
    extrude(amount=RESSALTO_EXTRUS_O2_DEPTH)

    # Esboço1<4> → Corte-extrusão1 (cut)
    with BuildSketch(Plane(origin=(0, 0, 0), x_dir=(1, 0, 0), z_dir=(0, 1, 0)).offset(CORTE_EXTRUS_O1_START)):
        with Locations(Location((-11.844038585, -18.915106397, 0), (0, 0, 90))):
            Circle(ESBO_O1_4_R)
        with Locations(Location((18.915106397, -11.844038585, 0), (0, 0, 90))):
            Circle(ESBO_O1_4_R)
        with Locations(Location((-18.915106397, 11.844038585, 0), (0, 0, 90))):
            Circle(ESBO_O1_4_R)
        with Locations(Location((-18.915106397, -11.844038585, 0), (0, 0, 90))):
            Circle(ESBO_O1_4_R)
        with Locations(Location((11.844038585, -18.915106397, 0), (0, 0, 90))):
            Circle(ESBO_O1_4_R)
        with Locations(Location((18.915106397, 11.844038585, 0), (0, 0, 90))):
            Circle(ESBO_O1_4_R)
        with Locations(Location((11.844038585, 18.915106397, 0), (0, 0, 90))):
            Circle(ESBO_O1_4_R)
        with Locations(Location((-11.844038585, 18.915106397, 0), (0, 0, 90))):
            Circle(ESBO_O1_4_R)
    extrude(amount=CORTE_EXTRUS_O1_DEPTH, mode=Mode.SUBTRACT)

    # Filete1
    filete1_edges = [part.edges().sort_by_distance(p)[0] for p in [
        (-14.269532703, 0, 20.99999997),
        (14.269532672, 0, 20.99999997),
        (20.99999997, 0, 14.269532672),
        (20.99999997, 0, -14.269532702),
        (14.269532672, 0, -21),
        (-14.269532702, 0, -21),
        (-21, 0, -14.269532703),
        (-21, 0, 14.269532672),
    ]]
    fillet(filete1_edges, radius=FILETE1_R)


solid = part.part
